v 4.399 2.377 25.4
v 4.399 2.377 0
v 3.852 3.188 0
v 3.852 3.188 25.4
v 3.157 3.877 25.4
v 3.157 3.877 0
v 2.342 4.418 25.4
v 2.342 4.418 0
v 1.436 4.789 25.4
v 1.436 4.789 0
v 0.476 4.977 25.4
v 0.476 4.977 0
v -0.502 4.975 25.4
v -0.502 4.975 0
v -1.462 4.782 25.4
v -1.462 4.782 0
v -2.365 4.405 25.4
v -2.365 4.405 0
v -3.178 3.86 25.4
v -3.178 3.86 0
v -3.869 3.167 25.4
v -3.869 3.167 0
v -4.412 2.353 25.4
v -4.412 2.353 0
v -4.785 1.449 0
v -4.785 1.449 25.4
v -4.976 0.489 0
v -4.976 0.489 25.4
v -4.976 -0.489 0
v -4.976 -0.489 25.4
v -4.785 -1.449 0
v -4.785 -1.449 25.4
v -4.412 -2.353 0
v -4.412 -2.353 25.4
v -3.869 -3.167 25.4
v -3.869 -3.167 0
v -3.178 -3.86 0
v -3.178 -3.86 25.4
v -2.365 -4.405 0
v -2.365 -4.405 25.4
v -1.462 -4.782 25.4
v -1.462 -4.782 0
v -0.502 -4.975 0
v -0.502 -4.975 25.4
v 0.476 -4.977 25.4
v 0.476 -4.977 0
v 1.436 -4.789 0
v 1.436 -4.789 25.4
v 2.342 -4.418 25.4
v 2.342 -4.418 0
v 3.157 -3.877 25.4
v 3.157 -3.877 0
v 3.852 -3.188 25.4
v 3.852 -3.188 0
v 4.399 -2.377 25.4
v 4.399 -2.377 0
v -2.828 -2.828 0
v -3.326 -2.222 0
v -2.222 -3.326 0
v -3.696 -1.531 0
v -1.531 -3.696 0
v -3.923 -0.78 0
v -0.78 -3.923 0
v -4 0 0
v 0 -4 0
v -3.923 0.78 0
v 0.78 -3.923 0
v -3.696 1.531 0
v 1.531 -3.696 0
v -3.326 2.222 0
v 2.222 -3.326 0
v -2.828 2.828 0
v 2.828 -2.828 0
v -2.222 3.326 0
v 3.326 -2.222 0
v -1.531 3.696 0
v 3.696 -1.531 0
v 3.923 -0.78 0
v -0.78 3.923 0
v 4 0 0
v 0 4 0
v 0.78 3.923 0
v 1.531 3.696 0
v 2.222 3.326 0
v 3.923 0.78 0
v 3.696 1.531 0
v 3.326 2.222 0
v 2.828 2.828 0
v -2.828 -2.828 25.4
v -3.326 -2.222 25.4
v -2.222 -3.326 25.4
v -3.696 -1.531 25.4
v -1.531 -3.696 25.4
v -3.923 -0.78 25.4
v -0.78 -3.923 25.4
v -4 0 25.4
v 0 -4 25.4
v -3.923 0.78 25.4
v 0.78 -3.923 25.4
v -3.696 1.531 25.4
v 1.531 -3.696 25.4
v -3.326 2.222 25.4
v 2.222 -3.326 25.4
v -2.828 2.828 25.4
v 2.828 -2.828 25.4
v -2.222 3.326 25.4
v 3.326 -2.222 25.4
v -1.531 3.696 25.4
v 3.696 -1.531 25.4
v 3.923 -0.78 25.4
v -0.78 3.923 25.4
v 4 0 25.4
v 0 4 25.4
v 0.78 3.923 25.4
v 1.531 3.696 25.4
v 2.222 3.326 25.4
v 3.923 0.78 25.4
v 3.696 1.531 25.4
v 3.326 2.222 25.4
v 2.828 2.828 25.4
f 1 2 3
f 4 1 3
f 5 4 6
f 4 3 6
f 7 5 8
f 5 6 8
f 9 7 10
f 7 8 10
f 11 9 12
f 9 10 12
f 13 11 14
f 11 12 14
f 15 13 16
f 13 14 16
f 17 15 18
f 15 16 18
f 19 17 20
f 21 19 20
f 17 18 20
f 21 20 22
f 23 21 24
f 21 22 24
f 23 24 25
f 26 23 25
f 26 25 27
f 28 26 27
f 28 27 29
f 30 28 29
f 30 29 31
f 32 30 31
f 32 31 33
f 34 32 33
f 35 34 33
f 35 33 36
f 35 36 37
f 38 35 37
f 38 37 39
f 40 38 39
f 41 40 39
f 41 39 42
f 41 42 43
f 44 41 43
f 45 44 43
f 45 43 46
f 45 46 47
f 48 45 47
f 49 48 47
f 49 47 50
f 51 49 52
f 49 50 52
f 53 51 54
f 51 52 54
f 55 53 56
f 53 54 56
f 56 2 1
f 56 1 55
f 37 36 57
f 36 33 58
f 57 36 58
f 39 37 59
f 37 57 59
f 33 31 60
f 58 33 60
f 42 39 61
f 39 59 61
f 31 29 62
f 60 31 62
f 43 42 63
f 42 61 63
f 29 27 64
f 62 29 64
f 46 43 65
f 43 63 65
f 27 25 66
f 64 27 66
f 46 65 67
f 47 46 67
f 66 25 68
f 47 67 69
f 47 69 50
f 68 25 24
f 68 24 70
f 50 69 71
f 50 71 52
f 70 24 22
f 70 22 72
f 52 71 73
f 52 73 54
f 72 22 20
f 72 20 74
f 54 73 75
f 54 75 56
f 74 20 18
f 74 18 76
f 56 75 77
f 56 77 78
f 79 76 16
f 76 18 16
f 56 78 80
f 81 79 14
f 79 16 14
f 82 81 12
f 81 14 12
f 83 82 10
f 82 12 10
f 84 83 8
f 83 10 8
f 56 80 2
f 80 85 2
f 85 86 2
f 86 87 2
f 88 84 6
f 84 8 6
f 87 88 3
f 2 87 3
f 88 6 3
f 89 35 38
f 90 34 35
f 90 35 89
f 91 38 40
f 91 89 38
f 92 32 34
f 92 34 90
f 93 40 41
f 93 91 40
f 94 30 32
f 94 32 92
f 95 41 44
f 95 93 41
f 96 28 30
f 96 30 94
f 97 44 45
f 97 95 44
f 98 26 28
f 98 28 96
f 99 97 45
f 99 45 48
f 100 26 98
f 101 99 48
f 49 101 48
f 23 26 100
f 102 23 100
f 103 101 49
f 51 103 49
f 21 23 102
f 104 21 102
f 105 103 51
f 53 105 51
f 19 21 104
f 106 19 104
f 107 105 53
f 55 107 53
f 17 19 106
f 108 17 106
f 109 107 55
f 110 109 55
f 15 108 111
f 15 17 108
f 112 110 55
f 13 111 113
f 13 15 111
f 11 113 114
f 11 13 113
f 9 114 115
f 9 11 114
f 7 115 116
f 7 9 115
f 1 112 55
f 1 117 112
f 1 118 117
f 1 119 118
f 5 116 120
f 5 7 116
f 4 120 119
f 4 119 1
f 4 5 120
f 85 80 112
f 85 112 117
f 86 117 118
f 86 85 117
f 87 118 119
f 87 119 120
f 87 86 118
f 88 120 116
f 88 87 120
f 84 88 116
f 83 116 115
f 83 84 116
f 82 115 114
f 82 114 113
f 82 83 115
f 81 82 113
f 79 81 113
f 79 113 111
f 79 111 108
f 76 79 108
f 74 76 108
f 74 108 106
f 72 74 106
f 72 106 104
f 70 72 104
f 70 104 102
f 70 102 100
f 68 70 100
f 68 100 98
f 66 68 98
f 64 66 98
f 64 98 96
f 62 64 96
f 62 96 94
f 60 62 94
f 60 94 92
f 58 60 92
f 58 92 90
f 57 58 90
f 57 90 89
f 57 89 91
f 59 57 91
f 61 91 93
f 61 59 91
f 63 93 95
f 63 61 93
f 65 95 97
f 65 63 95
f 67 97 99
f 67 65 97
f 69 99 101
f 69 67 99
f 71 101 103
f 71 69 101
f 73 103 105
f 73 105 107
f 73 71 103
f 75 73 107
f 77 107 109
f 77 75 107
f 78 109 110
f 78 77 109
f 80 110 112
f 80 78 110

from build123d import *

# Parameters (mm, degrees)
F0_R     = 5
F1_DEPTH = 25.4
F2_T     = -1
F4_DEPTH = 25.4


with BuildPart() as f1:
    # F0 (on Top) → F1 (new body)
    with BuildSketch(Plane.XY):
        Circle(F0_R)
    extrude(amount=F1_DEPTH)

    # F2
    f2_openings = [f1.faces().sort_by_distance(p)[0] for p in [
        (0, 0, 25.4),
        (0, 0, 0),
    ]]
    offset(amount=F2_T, openings=f2_openings)

    # F3 (on Top) → F4 (cut)
    with BuildSketch(Plane.XY):
        with BuildLine():
            ThreePointArc((4.399024, -2.376676), (4.847428, -1.22574), (5, 0))
            ThreePointArc((5, 0), (4.847428, 1.22574), (4.399024, 2.376676))
            Line((4.399024, 2.376676), (4.399024, -2.376676))
        make_face()
    extrude(amount=F4_DEPTH, mode=Mode.SUBTRACT)


solid = f1.part
